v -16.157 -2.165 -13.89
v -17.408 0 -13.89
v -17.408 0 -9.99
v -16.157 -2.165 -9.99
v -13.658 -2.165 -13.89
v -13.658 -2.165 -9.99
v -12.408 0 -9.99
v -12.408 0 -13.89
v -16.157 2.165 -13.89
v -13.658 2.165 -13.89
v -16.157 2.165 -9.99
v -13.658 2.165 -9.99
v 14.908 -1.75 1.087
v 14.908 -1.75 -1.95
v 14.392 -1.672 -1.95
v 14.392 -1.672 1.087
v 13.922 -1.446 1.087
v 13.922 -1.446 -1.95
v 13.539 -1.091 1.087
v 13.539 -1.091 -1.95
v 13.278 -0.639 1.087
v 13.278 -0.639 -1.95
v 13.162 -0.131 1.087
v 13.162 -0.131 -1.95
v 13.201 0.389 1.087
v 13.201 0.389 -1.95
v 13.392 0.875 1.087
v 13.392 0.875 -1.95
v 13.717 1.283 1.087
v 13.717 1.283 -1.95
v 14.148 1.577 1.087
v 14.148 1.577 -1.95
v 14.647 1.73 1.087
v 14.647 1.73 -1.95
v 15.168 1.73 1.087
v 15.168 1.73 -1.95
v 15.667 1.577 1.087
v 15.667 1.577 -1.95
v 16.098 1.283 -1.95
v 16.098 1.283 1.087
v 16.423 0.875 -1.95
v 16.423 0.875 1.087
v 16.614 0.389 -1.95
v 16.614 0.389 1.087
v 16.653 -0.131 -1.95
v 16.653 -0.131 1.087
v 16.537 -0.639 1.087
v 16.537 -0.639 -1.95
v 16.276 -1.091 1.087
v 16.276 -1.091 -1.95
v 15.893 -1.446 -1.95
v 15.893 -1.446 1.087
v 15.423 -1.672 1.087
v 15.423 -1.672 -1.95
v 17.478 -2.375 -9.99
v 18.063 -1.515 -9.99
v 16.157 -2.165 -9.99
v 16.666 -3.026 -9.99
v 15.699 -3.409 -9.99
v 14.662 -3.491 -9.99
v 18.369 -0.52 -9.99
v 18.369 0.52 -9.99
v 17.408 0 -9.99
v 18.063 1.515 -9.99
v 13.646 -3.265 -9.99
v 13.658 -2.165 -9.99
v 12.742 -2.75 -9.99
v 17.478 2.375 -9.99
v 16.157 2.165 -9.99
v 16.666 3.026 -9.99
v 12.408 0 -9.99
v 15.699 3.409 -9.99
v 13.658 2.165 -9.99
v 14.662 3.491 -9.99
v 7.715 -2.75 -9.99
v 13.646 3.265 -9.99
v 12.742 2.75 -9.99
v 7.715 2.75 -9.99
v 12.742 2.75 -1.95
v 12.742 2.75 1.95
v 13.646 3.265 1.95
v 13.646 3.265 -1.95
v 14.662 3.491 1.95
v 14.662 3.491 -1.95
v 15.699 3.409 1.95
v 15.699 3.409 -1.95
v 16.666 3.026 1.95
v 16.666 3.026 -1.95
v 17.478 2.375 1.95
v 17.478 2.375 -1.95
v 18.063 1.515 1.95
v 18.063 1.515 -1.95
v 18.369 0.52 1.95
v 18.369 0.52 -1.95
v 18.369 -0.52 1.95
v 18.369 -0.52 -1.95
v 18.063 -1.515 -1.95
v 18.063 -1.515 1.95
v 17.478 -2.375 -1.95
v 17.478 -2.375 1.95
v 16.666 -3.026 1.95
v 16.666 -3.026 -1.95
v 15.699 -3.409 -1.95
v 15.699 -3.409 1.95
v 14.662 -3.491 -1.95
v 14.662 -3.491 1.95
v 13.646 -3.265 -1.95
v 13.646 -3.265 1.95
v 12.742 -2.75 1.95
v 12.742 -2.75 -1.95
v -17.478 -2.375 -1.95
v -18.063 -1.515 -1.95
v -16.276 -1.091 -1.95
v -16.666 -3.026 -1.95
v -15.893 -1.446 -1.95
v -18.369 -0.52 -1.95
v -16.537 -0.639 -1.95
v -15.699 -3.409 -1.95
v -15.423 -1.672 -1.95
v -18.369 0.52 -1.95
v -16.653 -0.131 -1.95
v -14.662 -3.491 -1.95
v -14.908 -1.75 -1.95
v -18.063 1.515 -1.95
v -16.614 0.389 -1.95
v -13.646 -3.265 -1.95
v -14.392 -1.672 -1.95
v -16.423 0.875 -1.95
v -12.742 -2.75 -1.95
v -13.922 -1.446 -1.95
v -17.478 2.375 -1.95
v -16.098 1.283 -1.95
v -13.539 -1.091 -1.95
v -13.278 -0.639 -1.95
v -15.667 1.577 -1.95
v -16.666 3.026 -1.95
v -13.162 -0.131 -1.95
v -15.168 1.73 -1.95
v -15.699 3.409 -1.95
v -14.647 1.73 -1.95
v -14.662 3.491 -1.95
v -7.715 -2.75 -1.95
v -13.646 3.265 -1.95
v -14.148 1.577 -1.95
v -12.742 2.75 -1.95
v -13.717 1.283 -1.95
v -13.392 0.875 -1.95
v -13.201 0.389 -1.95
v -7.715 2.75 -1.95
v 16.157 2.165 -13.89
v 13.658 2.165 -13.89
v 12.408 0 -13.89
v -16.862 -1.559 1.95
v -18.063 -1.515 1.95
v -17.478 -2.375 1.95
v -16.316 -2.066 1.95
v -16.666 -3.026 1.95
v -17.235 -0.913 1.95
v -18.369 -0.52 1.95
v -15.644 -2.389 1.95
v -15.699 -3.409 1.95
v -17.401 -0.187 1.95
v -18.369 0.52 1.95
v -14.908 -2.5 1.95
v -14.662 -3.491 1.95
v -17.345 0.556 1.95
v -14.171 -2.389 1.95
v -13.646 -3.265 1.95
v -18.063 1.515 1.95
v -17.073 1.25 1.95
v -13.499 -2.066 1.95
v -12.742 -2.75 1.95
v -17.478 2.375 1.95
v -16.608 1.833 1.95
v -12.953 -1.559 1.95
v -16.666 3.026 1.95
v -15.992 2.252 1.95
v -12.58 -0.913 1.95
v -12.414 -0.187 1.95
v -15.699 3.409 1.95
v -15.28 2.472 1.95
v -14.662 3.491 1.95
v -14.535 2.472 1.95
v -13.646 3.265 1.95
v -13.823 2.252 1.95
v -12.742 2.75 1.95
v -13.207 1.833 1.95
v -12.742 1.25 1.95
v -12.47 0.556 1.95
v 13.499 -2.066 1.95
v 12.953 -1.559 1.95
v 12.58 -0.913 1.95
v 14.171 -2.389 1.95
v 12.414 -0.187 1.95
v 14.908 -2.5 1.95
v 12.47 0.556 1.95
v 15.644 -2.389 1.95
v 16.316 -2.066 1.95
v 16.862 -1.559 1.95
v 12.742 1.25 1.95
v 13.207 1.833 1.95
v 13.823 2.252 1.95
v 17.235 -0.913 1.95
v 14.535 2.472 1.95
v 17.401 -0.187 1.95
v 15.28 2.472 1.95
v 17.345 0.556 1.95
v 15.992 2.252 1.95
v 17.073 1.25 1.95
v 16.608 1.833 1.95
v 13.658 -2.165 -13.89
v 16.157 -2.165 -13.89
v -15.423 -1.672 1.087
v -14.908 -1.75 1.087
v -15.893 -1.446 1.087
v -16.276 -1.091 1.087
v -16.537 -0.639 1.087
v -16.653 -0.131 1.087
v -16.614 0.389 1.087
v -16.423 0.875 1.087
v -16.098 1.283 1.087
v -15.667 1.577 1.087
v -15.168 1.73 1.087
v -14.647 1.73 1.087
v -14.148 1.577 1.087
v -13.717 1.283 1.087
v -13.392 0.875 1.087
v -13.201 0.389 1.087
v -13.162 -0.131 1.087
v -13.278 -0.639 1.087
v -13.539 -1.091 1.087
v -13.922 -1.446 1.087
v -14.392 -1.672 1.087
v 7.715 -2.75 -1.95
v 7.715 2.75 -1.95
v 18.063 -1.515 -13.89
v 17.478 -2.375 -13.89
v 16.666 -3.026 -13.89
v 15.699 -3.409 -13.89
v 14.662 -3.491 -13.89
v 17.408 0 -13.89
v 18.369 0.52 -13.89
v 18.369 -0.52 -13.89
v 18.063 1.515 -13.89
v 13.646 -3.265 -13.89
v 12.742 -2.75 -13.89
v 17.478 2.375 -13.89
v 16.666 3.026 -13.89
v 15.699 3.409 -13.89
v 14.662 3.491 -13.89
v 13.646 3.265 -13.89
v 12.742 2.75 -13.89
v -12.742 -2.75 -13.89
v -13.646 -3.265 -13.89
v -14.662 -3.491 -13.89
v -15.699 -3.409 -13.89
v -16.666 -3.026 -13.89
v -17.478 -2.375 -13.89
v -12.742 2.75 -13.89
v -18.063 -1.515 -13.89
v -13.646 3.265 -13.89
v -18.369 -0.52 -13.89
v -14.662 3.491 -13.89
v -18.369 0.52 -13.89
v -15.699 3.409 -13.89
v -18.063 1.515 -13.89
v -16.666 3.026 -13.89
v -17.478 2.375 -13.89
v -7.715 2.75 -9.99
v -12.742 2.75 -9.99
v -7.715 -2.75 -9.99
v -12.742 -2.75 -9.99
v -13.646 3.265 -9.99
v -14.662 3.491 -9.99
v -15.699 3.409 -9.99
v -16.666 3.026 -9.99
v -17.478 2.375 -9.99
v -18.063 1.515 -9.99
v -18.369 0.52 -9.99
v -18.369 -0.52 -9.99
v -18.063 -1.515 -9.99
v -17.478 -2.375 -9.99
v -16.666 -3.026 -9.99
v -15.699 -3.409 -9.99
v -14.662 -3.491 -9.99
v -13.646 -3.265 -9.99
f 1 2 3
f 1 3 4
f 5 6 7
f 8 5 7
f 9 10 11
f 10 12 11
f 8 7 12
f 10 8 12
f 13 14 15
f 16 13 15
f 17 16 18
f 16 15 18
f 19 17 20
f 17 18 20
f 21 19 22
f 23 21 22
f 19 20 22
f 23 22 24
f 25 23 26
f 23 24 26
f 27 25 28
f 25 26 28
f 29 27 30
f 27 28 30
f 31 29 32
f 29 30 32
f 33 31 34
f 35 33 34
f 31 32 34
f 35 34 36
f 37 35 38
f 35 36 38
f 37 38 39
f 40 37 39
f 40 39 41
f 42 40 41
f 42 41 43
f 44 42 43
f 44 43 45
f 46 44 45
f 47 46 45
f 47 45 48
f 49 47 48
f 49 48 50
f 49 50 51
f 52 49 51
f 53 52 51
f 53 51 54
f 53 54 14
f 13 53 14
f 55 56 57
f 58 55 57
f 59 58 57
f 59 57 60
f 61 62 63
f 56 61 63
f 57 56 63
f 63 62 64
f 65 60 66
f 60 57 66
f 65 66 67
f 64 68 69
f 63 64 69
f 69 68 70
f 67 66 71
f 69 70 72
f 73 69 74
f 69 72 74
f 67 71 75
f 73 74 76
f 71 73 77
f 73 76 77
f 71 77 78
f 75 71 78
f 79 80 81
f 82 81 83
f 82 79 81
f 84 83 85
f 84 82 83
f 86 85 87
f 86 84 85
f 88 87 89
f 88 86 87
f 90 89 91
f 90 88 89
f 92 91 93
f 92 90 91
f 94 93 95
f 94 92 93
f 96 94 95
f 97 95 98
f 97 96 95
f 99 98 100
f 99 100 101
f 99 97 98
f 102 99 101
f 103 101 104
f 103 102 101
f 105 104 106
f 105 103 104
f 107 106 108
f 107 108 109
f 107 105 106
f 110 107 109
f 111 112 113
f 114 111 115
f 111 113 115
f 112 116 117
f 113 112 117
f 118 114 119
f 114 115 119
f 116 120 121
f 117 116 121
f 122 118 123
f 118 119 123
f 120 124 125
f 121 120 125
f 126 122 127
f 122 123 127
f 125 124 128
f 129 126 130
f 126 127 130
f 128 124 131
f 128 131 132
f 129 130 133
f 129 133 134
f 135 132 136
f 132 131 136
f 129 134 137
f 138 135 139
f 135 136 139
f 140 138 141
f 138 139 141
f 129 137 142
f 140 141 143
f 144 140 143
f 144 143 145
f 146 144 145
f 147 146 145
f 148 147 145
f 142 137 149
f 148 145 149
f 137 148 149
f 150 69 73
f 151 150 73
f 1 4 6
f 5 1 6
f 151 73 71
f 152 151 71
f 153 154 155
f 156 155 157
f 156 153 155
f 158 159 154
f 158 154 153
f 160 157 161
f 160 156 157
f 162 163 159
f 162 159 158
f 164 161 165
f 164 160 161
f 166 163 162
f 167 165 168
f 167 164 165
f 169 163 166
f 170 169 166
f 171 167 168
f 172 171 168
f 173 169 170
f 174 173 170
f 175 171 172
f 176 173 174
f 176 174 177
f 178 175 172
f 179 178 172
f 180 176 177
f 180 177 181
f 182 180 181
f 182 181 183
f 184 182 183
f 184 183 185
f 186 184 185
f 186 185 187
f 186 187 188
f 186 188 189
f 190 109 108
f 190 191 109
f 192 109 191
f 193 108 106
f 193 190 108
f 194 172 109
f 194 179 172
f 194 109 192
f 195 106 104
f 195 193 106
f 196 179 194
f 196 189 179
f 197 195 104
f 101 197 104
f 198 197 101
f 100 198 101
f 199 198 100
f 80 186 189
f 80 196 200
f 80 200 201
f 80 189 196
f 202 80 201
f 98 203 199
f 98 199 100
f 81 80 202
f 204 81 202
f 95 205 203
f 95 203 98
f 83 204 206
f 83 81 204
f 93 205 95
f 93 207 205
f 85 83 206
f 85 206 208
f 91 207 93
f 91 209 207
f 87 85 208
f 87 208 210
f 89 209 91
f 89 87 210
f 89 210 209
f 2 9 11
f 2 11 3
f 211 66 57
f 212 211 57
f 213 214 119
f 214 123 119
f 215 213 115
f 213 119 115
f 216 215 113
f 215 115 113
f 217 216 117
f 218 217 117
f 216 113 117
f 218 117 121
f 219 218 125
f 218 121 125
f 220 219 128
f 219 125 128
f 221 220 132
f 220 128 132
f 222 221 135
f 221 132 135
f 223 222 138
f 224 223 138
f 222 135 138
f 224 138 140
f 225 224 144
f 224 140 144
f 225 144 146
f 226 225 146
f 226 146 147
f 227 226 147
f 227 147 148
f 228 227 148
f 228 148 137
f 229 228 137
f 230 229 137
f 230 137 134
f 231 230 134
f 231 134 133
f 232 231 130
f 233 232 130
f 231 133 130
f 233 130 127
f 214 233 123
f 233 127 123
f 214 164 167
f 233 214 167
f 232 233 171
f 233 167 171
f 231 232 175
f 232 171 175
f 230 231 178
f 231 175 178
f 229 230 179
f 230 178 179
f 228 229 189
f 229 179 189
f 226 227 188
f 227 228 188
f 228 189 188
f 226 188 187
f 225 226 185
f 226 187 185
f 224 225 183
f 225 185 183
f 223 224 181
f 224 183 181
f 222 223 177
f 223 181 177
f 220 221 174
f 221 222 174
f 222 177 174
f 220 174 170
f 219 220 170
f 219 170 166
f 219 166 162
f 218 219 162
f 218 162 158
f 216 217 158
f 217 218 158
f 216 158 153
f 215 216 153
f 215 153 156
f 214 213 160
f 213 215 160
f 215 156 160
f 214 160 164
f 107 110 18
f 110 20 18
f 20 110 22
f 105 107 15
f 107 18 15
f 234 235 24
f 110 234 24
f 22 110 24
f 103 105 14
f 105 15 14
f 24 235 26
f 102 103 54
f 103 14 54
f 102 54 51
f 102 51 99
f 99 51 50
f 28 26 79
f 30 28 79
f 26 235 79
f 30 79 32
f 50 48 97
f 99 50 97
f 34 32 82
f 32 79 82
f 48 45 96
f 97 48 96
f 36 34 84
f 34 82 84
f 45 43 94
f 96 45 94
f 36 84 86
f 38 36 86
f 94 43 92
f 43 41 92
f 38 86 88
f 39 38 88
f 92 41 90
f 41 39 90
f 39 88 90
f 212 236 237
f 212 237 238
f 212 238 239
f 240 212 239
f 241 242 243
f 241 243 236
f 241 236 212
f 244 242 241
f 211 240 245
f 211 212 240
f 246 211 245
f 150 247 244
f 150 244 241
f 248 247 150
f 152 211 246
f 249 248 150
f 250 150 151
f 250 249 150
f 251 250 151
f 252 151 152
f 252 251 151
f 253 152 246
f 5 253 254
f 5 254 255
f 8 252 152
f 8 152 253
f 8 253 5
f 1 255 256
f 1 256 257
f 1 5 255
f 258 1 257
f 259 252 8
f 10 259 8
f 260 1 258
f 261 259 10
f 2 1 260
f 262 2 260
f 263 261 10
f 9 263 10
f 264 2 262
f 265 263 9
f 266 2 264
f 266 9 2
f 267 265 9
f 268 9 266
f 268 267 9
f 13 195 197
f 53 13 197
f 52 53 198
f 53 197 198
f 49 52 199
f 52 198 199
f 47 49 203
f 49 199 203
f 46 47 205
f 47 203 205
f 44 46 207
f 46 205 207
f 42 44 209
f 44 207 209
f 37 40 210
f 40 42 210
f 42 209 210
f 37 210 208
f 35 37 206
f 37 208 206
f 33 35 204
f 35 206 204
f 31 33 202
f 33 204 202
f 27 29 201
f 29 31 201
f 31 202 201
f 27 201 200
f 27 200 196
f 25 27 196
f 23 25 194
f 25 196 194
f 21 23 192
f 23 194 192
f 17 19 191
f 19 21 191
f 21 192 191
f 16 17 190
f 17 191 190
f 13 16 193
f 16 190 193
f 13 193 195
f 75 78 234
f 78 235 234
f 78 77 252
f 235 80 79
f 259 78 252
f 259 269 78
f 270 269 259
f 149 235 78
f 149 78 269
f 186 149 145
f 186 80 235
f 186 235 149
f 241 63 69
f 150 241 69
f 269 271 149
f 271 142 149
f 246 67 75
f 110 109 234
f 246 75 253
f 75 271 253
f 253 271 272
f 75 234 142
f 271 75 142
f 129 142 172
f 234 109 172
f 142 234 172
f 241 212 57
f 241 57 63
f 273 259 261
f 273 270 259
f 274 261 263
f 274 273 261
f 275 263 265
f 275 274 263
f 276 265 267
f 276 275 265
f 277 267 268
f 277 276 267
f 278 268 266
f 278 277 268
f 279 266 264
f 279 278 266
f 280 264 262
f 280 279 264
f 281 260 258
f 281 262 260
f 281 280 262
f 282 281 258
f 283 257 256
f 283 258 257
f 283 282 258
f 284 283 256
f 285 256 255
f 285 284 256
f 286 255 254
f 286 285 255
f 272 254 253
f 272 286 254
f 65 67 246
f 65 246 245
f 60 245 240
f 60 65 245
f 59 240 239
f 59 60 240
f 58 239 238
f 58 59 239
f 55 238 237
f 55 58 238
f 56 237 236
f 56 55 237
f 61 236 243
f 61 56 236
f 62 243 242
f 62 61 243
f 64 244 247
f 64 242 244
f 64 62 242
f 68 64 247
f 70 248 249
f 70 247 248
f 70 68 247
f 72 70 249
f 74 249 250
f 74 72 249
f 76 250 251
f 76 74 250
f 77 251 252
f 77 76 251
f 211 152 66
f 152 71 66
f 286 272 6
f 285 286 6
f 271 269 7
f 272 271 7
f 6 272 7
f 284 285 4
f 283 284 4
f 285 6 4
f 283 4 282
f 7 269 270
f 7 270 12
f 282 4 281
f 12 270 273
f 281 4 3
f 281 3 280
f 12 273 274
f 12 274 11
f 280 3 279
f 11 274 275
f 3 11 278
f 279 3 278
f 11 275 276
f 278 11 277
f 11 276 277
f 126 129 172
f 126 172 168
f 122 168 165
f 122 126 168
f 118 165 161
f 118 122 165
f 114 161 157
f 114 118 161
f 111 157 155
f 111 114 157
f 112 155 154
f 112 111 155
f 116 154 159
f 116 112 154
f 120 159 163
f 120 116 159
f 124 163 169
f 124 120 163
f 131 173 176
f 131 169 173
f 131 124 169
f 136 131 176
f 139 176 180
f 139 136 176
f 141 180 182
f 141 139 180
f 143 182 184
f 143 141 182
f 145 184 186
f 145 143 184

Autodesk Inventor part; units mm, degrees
ref_plane "YZ Plane" through (0, 0, 0) normal (1, 0, 0) x (0, 1, 0)
ref_plane "XZ Plane" through (0, 0, 0) normal (0, 1, 0) x (-1, 0, 0)
ref_plane "XY Plane" through (0, 0, 0) normal (0, 0, 1) x (1, 0, 0)
sketch "Esboço1" plane through (0, 0, 0) normal (0, 0, 1) x (1, 0, 0)
  line L0 (-12.7424, 2.75) -> (12.7424, 2.75)
  line L1 (-12.7424, -2.75) -> (12.7424, -2.75)
  circle A0 centre (-14.9075, 0) radius 3.5
  circle A1 centre (14.9075, 0) radius 3.5
  circle A2 centre (-14.9075, 0) radius 2.5
  circle A3 centre (14.9075, 0) radius 2.5
  point P0 (0, 0)
  point P1 (0, 2.75)
  point P2 (0, -2.75)
  dimension "d7" = 7
  dimension "d5" = 2.75
  dimension "d6" = 2.75
  dimension "d9" = 14.9075
  dimension "d11" = 29.815
  dimension "d12" = 5
  dimension "d13" = 5
extrude "Extrusão1" add sketch "Esboço1" along normal mid plane 3.9 contours L0 A1 L1 A0 | A0 | A1 | A2 | A3
sketch "Esboço2" plane through (0, 0, -1.95) normal (0, 0, -1) x (-1, 0, 0)
  line L0 (-7.7154, -2.75) -> (7.7154, -2.75)
  line L1 (7.7154, -2.75) -> (7.7154, 2.75)
  line L2 (7.7154, 2.75) -> (-7.7154, 2.75)
  line L3 (-7.7154, 2.75) -> (-7.7154, -2.75)
  line L4 (-7.7154, -2.75) -> (7.7154, 2.75) construction
  line L5 (7.7154, -2.75) -> (-7.7154, 2.75) construction
  line L6 (12.7424, 2.75) -> (-12.7424, 2.75) projected
  line L7 (-12.7424, -2.75) -> (12.7424, -2.75) projected
  point P0 (0, 0)
  point P1 (0, 2.75)
  point P2 (0, -2.75)
  point P3 (7.7154, 0)
  point P4 (0, 2.75)
  dimension "d21" = 15.4307
extrude "Extrusão2" add sketch "Esboço2" along normal blind 8.04
sketch "Esboço3" plane through (0, 0, 1.95) normal (0, 0, 1) x (1, 0, 0)
  arc A0 (12.7424, -2.75) -> (12.7424, 2.75) centre (14.9075, 0) ccw projected
  point P0 (0, 0)
hole "Furo1" at (14.9075, 0, 1.95) direction (0, 0, -1) diameter 3.5 end through all countersink diameter 5 countersink angle 82
sketch "Esboço4" plane through (0, 0, 1.95) normal (0, 0, 1) x (1, 0, 0)
  arc A0 (-12.7424, 2.75) -> (-12.7424, -2.75) centre (-14.9075, 0) ccw projected
  point P0 (0, 0)
hole "Furo2" at (-14.9075, 0, 1.95) direction (0, 0, -1) diameter 3.5 end through all countersink diameter 5 countersink angle 82
sketch "Esboço5" plane through (0, 0, -9.99) normal (0, 0, -1) x (-1, 0, 0)
  arc A0 (-12.7424, 2.75) -> (-12.7424, -2.75) centre (-14.9075, 0) ccw projected
  circle A1 centre (-14.9075, 0) radius 3.5
  arc A2 (12.7424, -2.75) -> (12.7424, 2.75) centre (14.9075, 0) ccw projected
  circle A3 centre (14.9075, 0) radius 3.5
  line L0 (-12.7424, 2.75) -> (12.7424, 2.75)
  line L1 (-12.7424, -2.75) -> (12.7424, -2.75)
  circle A4 centre (-14.9075, 0) radius 2.5 projected
  line L2 (-13.6575, -2.1651) -> (-16.1575, -2.1651)
  line L3 (-16.1575, -2.1651) -> (-17.4075, 0)
  line L4 (-17.4075, 0) -> (-16.1575, 2.1651)
  line L5 (-16.1575, 2.1651) -> (-13.6575, 2.1651)
  line L6 (-13.6575, 2.1651) -> (-12.4075, 0)
  line L7 (-12.4075, 0) -> (-13.6575, -2.1651)
  circle A5 centre (14.9075, 0) radius 2.5 projected
  line L8 (13.6575, -2.1651) -> (12.4075, 0)
  line L9 (12.4075, 0) -> (13.6575, 2.1651)
  line L10 (13.6575, 2.1651) -> (16.1575, 2.1651)
  line L11 (16.1575, 2.1651) -> (17.4075, 0)
  line L12 (17.4075, 0) -> (16.1575, -2.1651)
  line L13 (16.1575, -2.1651) -> (13.6575, -2.1651)
  point P0 (0, 0)
  point P1 (-12.7424, -2.75)
  point P2 (-12.7424, 2.75)
  dimension "d37" = 7
extrude "Extrusão3" add sketch "Esboço5" along normal blind 3.9 contours A1 A0 | L0 A3 L1 A1 | A2 A3 | L6 A4 | A4 L7 | L5 A4 | A4 L2 | L4 A4 | A4 L3 | L11 A5 | A5 L12 | L10 A5 | A5 L13 | L9 A5 | A5 L8
equation "\"d6\" = d5"
properties part number "Barra1_0001_001" material "Borracha"
